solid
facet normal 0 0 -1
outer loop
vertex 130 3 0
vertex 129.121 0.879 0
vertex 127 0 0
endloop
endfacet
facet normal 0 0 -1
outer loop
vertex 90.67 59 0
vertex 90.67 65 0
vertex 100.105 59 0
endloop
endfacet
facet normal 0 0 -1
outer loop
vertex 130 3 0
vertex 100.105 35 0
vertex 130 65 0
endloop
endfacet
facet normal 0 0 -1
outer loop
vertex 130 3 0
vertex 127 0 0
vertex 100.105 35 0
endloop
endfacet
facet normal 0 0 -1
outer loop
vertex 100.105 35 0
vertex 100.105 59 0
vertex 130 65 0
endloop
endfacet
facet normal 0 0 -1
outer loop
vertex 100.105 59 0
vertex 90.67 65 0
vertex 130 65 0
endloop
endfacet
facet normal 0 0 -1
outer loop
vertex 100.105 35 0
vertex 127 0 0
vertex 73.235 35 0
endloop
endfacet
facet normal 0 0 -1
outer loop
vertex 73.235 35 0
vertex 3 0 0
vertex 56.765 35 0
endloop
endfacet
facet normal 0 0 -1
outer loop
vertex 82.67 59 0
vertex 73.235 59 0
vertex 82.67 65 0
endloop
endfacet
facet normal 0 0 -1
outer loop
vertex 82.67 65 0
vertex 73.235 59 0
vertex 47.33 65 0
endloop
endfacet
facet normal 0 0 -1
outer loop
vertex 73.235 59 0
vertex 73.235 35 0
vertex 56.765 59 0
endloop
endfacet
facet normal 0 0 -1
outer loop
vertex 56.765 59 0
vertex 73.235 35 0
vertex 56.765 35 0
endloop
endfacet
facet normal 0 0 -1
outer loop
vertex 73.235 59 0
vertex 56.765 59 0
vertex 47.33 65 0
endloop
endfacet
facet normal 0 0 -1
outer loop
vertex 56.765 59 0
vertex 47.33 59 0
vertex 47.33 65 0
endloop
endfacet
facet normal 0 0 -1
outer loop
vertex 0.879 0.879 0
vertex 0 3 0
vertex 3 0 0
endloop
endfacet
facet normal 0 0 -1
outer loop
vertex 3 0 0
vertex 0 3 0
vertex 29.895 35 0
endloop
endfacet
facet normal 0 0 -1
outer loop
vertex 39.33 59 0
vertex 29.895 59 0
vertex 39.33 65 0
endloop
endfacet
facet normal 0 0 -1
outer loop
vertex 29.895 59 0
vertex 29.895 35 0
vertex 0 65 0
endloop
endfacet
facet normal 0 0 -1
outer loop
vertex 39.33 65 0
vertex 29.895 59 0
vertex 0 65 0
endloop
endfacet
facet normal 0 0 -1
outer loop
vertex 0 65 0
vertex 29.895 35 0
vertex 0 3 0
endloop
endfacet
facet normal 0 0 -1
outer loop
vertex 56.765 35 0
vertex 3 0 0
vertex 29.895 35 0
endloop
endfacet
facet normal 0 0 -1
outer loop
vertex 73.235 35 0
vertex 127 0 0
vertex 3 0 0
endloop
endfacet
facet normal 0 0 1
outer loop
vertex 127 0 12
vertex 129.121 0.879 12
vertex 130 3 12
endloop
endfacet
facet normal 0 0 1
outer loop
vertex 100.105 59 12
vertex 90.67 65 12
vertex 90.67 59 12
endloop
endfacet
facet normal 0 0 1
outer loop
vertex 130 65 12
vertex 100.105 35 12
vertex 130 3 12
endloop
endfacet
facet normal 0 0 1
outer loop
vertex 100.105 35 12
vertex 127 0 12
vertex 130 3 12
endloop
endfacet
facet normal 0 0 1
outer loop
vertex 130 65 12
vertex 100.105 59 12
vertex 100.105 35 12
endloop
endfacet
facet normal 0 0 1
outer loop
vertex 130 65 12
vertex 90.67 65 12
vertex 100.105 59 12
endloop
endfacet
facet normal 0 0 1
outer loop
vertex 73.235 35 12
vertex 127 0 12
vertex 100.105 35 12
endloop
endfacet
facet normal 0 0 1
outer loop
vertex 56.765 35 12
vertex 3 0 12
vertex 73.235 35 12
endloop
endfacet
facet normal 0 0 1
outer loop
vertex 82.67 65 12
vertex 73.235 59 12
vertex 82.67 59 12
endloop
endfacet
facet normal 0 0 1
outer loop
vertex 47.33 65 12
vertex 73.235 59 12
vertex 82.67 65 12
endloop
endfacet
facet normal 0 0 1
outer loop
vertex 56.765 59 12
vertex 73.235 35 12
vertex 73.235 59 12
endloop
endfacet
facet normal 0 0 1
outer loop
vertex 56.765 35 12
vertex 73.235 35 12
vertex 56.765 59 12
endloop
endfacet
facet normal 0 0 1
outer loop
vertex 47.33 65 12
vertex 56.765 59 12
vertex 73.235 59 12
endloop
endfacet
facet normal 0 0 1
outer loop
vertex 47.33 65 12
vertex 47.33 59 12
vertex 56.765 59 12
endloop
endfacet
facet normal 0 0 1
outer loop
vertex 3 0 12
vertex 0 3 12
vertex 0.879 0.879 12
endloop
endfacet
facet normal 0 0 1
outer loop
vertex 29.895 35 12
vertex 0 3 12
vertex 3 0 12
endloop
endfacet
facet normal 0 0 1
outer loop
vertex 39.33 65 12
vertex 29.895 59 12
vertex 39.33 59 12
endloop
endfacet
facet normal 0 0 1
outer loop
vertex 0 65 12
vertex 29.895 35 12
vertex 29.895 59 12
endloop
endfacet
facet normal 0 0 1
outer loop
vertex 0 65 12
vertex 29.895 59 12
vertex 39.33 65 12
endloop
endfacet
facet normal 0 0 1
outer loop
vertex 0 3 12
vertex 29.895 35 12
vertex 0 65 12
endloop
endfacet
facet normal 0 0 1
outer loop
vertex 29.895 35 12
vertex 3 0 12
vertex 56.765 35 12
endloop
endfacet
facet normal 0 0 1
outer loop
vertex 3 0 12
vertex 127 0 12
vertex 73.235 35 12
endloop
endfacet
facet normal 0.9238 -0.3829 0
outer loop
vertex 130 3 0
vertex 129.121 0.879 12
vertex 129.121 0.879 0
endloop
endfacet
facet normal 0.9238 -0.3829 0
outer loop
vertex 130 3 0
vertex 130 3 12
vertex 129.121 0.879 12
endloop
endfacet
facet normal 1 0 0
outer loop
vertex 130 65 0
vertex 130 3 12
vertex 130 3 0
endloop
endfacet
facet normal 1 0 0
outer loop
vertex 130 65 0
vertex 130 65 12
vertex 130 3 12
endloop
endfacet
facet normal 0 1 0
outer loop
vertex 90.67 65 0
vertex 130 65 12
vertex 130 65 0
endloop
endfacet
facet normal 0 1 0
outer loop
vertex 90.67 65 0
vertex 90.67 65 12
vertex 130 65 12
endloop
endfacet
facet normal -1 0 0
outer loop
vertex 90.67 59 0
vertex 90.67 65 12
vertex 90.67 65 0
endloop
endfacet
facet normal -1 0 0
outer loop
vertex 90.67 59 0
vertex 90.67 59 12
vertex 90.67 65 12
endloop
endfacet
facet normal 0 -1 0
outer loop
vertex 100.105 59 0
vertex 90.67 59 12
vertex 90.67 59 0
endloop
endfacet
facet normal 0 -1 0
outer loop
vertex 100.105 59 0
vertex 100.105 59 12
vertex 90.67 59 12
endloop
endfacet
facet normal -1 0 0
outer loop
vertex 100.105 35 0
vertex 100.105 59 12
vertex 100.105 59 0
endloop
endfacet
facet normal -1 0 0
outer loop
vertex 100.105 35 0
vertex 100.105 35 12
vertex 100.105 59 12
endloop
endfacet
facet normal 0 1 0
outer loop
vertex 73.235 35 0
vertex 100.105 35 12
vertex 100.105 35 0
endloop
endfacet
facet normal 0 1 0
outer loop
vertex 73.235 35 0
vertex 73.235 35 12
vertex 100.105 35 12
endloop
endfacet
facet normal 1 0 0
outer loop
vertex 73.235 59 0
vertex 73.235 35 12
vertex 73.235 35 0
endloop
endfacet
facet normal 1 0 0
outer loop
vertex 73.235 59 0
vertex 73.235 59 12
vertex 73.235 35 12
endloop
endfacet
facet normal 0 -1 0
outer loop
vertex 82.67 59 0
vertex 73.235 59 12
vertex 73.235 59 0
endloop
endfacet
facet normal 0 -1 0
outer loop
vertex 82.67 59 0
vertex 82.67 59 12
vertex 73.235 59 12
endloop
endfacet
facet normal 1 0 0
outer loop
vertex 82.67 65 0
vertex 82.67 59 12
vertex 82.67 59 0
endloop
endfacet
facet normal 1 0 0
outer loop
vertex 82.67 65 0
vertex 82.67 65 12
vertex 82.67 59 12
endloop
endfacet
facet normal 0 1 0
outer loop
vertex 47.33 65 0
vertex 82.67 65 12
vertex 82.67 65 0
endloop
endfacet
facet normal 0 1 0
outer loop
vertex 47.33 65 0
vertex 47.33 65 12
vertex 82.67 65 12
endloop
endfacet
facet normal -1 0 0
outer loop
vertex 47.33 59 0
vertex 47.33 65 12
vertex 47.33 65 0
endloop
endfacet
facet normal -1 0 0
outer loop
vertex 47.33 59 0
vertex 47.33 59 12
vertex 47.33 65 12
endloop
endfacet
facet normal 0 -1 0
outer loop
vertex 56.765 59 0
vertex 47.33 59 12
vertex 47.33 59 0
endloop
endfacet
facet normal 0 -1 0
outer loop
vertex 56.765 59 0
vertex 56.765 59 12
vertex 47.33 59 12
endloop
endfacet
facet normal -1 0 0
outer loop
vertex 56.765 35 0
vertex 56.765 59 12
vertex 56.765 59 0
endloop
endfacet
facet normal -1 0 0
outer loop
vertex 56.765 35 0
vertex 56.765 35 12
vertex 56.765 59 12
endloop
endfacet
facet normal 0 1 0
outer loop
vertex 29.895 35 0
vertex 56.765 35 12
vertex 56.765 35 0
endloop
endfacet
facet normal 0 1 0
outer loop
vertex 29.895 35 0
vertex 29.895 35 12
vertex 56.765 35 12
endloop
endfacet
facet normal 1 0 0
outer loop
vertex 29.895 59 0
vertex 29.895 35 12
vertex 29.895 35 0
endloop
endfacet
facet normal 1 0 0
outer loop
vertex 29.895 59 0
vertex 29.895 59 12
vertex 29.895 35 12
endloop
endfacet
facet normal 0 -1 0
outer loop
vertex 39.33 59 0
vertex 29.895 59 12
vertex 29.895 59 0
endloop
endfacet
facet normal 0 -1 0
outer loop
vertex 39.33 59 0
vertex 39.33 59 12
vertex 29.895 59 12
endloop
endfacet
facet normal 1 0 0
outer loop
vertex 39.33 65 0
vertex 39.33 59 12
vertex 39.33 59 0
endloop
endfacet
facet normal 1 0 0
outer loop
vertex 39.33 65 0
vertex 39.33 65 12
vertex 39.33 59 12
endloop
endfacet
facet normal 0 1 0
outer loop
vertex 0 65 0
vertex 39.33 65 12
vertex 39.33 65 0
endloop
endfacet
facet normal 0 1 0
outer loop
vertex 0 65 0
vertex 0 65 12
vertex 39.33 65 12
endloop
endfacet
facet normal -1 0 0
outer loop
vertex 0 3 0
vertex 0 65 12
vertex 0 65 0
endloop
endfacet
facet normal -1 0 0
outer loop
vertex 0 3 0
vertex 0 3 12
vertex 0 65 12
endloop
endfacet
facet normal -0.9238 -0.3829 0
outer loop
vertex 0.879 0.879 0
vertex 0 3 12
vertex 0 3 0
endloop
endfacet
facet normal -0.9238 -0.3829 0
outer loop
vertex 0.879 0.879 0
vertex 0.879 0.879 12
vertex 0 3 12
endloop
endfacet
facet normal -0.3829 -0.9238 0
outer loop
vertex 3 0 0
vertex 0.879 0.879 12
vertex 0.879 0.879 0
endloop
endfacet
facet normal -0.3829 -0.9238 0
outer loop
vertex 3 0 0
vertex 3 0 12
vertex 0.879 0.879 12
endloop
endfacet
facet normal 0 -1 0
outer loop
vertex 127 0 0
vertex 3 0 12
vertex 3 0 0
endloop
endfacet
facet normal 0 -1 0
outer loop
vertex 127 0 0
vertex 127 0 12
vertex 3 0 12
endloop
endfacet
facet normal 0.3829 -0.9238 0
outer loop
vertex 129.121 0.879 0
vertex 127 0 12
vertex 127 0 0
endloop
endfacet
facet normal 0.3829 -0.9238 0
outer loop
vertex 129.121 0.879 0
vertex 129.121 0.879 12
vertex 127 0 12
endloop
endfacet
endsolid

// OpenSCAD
$fn = 32;

// ----------------------------------------------------------------------
// Window plate: 130 x 65 mm, 2 open windows
// ----------------------------------------------------------------------

// --- parameters (mm) ---
profile_height = 12;      // extrusion height
profile_points = 24;      // points of the closed outline

profile = [[0, 3], [0.879, 0.879], [3, 0], [127, 0], [129.121, 0.879], [130, 3], [130, 65], [90.67, 65], [90.67, 59], [100.105, 59], [100.105, 35], [73.235, 35], [73.235, 59], [82.67, 59], [82.67, 65], [47.33, 65], [47.33, 59], [56.765, 59], [56.765, 35], [29.895, 35], [29.895, 59], [39.33, 59], [39.33, 65], [0, 65]];  // single closed polygon, 24 points, counter clockwise

// --- the one profile operation ---
linear_extrude(height = profile_height) polygon(points = profile);
